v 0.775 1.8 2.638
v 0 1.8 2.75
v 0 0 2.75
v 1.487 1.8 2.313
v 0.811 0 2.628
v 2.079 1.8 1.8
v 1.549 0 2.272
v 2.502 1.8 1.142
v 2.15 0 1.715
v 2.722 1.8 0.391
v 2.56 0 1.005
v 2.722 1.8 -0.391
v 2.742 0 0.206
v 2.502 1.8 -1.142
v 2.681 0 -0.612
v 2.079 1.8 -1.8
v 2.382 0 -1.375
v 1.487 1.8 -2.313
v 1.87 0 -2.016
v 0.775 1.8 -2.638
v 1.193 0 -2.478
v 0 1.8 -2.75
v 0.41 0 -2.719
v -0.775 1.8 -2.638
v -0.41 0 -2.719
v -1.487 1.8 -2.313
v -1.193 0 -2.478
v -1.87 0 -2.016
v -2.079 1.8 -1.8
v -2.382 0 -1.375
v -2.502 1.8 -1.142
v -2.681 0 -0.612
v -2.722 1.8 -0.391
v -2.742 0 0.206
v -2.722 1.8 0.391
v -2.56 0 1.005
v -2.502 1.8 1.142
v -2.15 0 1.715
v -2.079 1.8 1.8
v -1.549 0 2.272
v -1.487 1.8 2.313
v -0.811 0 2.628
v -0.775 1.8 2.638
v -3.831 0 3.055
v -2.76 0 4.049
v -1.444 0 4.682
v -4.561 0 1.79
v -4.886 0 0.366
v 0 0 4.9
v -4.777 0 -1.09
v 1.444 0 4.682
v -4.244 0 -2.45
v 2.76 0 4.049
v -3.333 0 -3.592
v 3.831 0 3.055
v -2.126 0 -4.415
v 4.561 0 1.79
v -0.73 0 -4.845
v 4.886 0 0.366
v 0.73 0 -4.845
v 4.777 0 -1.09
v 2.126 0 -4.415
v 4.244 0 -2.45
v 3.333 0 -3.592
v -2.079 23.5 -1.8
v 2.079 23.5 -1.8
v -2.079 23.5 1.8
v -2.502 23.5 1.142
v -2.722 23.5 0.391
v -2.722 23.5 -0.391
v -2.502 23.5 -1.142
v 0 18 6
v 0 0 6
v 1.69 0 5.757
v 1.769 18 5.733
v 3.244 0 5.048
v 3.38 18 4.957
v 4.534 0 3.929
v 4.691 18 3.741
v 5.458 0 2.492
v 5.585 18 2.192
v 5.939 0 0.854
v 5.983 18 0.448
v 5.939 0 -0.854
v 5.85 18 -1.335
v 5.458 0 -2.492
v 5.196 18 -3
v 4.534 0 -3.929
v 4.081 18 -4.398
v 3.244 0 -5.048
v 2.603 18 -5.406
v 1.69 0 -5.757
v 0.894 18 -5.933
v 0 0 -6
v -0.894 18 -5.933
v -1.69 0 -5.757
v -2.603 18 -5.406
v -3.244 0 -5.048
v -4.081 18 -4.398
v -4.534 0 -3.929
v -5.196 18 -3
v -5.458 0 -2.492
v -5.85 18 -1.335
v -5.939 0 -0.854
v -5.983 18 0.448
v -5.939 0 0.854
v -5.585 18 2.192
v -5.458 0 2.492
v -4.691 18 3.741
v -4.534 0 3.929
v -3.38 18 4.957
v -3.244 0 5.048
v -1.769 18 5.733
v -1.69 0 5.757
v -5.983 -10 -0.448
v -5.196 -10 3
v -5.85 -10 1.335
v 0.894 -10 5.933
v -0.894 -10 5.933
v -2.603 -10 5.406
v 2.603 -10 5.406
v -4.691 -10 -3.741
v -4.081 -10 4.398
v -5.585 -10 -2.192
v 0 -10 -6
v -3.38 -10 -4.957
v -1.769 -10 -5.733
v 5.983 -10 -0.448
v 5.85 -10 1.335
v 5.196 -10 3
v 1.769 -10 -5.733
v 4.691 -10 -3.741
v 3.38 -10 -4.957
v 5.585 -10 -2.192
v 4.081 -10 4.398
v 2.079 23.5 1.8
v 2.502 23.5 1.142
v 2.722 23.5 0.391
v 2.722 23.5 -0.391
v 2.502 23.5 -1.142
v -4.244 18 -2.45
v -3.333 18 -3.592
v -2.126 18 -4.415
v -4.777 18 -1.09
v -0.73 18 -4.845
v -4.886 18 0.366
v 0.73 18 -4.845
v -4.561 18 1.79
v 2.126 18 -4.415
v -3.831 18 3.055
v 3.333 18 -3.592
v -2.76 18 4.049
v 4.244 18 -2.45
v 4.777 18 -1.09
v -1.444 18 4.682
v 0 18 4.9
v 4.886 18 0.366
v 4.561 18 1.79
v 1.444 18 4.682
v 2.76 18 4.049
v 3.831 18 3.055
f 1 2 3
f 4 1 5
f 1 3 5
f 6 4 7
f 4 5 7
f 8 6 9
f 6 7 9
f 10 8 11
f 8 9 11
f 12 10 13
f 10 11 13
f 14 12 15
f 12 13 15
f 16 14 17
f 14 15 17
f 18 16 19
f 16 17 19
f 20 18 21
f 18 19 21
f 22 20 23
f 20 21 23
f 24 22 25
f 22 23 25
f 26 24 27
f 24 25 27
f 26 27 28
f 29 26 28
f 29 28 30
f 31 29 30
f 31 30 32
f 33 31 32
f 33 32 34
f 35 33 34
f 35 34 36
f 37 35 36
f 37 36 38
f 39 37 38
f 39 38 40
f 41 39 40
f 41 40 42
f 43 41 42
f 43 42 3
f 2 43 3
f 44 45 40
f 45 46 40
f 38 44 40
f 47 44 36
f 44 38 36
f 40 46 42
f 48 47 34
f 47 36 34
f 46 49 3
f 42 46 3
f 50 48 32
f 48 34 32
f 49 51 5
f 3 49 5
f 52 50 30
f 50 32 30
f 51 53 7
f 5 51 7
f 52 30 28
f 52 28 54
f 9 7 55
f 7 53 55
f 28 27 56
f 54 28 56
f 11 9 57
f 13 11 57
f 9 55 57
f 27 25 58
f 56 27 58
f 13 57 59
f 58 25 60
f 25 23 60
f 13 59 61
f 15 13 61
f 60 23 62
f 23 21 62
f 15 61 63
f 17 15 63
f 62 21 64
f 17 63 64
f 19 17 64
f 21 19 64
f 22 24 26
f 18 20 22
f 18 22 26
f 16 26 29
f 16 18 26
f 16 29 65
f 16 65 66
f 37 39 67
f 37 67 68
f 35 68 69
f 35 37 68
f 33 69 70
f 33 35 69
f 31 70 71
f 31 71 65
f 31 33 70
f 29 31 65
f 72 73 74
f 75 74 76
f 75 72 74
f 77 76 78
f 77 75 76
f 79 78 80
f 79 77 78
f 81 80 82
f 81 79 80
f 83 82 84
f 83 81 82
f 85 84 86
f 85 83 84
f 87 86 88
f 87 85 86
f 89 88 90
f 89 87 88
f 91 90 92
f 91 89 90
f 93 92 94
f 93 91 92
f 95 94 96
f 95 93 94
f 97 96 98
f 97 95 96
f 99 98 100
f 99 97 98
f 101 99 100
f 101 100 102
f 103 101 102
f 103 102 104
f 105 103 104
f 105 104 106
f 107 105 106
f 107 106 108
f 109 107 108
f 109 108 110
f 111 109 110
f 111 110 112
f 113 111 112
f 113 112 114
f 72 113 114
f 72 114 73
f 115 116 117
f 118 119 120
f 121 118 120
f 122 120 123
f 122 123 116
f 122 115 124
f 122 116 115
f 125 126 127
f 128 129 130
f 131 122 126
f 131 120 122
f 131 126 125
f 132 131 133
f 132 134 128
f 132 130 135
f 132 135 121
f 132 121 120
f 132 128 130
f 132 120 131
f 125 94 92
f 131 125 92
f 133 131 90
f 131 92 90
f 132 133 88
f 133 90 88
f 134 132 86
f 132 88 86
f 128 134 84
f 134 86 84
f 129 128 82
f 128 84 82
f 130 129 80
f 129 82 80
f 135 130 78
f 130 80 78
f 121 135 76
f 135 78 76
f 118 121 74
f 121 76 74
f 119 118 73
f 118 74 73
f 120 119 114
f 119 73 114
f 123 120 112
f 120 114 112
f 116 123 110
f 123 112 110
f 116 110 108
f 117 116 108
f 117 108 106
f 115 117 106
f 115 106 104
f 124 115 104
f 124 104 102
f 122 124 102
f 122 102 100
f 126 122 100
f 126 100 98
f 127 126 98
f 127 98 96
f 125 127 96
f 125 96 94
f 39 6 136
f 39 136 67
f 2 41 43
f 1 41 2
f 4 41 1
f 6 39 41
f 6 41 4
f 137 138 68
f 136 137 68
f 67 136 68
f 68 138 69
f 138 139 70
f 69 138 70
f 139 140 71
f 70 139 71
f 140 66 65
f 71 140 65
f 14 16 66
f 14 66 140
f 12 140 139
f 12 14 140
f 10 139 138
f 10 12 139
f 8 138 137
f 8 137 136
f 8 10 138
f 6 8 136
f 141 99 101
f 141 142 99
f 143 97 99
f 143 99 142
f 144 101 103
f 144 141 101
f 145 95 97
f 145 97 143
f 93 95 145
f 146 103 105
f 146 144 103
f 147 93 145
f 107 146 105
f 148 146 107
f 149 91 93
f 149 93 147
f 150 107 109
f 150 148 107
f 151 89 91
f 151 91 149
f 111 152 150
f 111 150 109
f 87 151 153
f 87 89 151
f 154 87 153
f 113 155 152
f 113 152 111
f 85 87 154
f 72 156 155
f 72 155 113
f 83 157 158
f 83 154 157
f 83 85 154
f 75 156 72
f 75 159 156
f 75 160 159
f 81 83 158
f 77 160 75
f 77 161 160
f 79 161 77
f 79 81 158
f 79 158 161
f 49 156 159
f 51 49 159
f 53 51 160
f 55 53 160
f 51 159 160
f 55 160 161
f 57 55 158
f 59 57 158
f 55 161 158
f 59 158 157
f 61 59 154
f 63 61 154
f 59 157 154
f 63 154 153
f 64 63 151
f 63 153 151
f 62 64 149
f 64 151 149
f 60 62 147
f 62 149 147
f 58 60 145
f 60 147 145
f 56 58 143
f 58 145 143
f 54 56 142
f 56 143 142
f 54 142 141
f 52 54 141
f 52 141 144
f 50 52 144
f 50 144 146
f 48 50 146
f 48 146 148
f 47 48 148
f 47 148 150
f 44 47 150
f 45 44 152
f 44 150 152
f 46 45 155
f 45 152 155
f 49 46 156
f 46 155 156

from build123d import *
from build123d.topology import SkipClean

# Parameters (mm, degrees)
SKETCH1_R           = 2.75
BOSS_EXTRUDE1_DEPTH = 1.8
BOSS_EXTRUDE2_DEPTH = 21.7
SKETCH4_R           = 6
BOSS_EXTRUDE3_DEPTH = 10
BOSS_EXTRUDE4_START = 18
SKETCH5_R           = 6
SKETCH5_R_2         = 4.9
BOSS_EXTRUDE4_DEPTH = 18


with BuildPart() as part:
    # Sketch1 → Boss-Extrude1 (new body)
    with BuildSketch(Plane(origin=(0, 0, 0), x_dir=(1, 0, 0), z_dir=(0, 1, 0))):
        with Locations(Location((0, 0, 0), (0, 0, 270))):
            Circle(SKETCH1_R)
    extrude(amount=BOSS_EXTRUDE1_DEPTH)

    # Sketch3 → Boss-Extrude2 (add)
    with SkipClean():  # the faces are left unmerged after this step: merging them gives an invalid solid
        with BuildSketch(Plane(origin=(0, 1.8, 0), x_dir=(1, 0, 0), z_dir=(0, 1, 0))):
            with BuildLine():
                Line((-2.0790623, 1.799999987), (2.0790623, 1.799999987))
                ThreePointArc((2.0790623, 1.799999987), (2.75, 0), (2.0790623, -1.799999987))
                Line((2.0790623, -1.799999987), (-2.0790623, -1.799999987))
                ThreePointArc((-2.0790623, -1.799999987), (-2.75, 0), (-2.0790623, 1.799999987))
            make_face()
        extrude(amount=BOSS_EXTRUDE2_DEPTH)

    # Sketch4 → Boss-Extrude3 (add)
    with SkipClean():  # the faces are left unmerged after this step: merging them gives an invalid solid
        with BuildSketch(Plane.XZ):
            with Locations(Location((0, 0, 0), (0, 0, 270))):
                Circle(SKETCH4_R)
        extrude(amount=BOSS_EXTRUDE3_DEPTH)

    # Sketch5 → Boss-Extrude4 (add)
    with BuildSketch(Plane(origin=(0, 0, 0), x_dir=(1, 0, 0), z_dir=(0, 1, 0)).offset(BOSS_EXTRUDE4_START)):
        with Locations(Location((0, 0, 0), (0, 0, 270))):
            Circle(SKETCH5_R)
        with Locations(Location((0, 0, 0), (0, 0, 270))):
            Circle(SKETCH5_R_2, mode=Mode.SUBTRACT)
    extrude(amount=-BOSS_EXTRUDE4_DEPTH)


solid = part.part
